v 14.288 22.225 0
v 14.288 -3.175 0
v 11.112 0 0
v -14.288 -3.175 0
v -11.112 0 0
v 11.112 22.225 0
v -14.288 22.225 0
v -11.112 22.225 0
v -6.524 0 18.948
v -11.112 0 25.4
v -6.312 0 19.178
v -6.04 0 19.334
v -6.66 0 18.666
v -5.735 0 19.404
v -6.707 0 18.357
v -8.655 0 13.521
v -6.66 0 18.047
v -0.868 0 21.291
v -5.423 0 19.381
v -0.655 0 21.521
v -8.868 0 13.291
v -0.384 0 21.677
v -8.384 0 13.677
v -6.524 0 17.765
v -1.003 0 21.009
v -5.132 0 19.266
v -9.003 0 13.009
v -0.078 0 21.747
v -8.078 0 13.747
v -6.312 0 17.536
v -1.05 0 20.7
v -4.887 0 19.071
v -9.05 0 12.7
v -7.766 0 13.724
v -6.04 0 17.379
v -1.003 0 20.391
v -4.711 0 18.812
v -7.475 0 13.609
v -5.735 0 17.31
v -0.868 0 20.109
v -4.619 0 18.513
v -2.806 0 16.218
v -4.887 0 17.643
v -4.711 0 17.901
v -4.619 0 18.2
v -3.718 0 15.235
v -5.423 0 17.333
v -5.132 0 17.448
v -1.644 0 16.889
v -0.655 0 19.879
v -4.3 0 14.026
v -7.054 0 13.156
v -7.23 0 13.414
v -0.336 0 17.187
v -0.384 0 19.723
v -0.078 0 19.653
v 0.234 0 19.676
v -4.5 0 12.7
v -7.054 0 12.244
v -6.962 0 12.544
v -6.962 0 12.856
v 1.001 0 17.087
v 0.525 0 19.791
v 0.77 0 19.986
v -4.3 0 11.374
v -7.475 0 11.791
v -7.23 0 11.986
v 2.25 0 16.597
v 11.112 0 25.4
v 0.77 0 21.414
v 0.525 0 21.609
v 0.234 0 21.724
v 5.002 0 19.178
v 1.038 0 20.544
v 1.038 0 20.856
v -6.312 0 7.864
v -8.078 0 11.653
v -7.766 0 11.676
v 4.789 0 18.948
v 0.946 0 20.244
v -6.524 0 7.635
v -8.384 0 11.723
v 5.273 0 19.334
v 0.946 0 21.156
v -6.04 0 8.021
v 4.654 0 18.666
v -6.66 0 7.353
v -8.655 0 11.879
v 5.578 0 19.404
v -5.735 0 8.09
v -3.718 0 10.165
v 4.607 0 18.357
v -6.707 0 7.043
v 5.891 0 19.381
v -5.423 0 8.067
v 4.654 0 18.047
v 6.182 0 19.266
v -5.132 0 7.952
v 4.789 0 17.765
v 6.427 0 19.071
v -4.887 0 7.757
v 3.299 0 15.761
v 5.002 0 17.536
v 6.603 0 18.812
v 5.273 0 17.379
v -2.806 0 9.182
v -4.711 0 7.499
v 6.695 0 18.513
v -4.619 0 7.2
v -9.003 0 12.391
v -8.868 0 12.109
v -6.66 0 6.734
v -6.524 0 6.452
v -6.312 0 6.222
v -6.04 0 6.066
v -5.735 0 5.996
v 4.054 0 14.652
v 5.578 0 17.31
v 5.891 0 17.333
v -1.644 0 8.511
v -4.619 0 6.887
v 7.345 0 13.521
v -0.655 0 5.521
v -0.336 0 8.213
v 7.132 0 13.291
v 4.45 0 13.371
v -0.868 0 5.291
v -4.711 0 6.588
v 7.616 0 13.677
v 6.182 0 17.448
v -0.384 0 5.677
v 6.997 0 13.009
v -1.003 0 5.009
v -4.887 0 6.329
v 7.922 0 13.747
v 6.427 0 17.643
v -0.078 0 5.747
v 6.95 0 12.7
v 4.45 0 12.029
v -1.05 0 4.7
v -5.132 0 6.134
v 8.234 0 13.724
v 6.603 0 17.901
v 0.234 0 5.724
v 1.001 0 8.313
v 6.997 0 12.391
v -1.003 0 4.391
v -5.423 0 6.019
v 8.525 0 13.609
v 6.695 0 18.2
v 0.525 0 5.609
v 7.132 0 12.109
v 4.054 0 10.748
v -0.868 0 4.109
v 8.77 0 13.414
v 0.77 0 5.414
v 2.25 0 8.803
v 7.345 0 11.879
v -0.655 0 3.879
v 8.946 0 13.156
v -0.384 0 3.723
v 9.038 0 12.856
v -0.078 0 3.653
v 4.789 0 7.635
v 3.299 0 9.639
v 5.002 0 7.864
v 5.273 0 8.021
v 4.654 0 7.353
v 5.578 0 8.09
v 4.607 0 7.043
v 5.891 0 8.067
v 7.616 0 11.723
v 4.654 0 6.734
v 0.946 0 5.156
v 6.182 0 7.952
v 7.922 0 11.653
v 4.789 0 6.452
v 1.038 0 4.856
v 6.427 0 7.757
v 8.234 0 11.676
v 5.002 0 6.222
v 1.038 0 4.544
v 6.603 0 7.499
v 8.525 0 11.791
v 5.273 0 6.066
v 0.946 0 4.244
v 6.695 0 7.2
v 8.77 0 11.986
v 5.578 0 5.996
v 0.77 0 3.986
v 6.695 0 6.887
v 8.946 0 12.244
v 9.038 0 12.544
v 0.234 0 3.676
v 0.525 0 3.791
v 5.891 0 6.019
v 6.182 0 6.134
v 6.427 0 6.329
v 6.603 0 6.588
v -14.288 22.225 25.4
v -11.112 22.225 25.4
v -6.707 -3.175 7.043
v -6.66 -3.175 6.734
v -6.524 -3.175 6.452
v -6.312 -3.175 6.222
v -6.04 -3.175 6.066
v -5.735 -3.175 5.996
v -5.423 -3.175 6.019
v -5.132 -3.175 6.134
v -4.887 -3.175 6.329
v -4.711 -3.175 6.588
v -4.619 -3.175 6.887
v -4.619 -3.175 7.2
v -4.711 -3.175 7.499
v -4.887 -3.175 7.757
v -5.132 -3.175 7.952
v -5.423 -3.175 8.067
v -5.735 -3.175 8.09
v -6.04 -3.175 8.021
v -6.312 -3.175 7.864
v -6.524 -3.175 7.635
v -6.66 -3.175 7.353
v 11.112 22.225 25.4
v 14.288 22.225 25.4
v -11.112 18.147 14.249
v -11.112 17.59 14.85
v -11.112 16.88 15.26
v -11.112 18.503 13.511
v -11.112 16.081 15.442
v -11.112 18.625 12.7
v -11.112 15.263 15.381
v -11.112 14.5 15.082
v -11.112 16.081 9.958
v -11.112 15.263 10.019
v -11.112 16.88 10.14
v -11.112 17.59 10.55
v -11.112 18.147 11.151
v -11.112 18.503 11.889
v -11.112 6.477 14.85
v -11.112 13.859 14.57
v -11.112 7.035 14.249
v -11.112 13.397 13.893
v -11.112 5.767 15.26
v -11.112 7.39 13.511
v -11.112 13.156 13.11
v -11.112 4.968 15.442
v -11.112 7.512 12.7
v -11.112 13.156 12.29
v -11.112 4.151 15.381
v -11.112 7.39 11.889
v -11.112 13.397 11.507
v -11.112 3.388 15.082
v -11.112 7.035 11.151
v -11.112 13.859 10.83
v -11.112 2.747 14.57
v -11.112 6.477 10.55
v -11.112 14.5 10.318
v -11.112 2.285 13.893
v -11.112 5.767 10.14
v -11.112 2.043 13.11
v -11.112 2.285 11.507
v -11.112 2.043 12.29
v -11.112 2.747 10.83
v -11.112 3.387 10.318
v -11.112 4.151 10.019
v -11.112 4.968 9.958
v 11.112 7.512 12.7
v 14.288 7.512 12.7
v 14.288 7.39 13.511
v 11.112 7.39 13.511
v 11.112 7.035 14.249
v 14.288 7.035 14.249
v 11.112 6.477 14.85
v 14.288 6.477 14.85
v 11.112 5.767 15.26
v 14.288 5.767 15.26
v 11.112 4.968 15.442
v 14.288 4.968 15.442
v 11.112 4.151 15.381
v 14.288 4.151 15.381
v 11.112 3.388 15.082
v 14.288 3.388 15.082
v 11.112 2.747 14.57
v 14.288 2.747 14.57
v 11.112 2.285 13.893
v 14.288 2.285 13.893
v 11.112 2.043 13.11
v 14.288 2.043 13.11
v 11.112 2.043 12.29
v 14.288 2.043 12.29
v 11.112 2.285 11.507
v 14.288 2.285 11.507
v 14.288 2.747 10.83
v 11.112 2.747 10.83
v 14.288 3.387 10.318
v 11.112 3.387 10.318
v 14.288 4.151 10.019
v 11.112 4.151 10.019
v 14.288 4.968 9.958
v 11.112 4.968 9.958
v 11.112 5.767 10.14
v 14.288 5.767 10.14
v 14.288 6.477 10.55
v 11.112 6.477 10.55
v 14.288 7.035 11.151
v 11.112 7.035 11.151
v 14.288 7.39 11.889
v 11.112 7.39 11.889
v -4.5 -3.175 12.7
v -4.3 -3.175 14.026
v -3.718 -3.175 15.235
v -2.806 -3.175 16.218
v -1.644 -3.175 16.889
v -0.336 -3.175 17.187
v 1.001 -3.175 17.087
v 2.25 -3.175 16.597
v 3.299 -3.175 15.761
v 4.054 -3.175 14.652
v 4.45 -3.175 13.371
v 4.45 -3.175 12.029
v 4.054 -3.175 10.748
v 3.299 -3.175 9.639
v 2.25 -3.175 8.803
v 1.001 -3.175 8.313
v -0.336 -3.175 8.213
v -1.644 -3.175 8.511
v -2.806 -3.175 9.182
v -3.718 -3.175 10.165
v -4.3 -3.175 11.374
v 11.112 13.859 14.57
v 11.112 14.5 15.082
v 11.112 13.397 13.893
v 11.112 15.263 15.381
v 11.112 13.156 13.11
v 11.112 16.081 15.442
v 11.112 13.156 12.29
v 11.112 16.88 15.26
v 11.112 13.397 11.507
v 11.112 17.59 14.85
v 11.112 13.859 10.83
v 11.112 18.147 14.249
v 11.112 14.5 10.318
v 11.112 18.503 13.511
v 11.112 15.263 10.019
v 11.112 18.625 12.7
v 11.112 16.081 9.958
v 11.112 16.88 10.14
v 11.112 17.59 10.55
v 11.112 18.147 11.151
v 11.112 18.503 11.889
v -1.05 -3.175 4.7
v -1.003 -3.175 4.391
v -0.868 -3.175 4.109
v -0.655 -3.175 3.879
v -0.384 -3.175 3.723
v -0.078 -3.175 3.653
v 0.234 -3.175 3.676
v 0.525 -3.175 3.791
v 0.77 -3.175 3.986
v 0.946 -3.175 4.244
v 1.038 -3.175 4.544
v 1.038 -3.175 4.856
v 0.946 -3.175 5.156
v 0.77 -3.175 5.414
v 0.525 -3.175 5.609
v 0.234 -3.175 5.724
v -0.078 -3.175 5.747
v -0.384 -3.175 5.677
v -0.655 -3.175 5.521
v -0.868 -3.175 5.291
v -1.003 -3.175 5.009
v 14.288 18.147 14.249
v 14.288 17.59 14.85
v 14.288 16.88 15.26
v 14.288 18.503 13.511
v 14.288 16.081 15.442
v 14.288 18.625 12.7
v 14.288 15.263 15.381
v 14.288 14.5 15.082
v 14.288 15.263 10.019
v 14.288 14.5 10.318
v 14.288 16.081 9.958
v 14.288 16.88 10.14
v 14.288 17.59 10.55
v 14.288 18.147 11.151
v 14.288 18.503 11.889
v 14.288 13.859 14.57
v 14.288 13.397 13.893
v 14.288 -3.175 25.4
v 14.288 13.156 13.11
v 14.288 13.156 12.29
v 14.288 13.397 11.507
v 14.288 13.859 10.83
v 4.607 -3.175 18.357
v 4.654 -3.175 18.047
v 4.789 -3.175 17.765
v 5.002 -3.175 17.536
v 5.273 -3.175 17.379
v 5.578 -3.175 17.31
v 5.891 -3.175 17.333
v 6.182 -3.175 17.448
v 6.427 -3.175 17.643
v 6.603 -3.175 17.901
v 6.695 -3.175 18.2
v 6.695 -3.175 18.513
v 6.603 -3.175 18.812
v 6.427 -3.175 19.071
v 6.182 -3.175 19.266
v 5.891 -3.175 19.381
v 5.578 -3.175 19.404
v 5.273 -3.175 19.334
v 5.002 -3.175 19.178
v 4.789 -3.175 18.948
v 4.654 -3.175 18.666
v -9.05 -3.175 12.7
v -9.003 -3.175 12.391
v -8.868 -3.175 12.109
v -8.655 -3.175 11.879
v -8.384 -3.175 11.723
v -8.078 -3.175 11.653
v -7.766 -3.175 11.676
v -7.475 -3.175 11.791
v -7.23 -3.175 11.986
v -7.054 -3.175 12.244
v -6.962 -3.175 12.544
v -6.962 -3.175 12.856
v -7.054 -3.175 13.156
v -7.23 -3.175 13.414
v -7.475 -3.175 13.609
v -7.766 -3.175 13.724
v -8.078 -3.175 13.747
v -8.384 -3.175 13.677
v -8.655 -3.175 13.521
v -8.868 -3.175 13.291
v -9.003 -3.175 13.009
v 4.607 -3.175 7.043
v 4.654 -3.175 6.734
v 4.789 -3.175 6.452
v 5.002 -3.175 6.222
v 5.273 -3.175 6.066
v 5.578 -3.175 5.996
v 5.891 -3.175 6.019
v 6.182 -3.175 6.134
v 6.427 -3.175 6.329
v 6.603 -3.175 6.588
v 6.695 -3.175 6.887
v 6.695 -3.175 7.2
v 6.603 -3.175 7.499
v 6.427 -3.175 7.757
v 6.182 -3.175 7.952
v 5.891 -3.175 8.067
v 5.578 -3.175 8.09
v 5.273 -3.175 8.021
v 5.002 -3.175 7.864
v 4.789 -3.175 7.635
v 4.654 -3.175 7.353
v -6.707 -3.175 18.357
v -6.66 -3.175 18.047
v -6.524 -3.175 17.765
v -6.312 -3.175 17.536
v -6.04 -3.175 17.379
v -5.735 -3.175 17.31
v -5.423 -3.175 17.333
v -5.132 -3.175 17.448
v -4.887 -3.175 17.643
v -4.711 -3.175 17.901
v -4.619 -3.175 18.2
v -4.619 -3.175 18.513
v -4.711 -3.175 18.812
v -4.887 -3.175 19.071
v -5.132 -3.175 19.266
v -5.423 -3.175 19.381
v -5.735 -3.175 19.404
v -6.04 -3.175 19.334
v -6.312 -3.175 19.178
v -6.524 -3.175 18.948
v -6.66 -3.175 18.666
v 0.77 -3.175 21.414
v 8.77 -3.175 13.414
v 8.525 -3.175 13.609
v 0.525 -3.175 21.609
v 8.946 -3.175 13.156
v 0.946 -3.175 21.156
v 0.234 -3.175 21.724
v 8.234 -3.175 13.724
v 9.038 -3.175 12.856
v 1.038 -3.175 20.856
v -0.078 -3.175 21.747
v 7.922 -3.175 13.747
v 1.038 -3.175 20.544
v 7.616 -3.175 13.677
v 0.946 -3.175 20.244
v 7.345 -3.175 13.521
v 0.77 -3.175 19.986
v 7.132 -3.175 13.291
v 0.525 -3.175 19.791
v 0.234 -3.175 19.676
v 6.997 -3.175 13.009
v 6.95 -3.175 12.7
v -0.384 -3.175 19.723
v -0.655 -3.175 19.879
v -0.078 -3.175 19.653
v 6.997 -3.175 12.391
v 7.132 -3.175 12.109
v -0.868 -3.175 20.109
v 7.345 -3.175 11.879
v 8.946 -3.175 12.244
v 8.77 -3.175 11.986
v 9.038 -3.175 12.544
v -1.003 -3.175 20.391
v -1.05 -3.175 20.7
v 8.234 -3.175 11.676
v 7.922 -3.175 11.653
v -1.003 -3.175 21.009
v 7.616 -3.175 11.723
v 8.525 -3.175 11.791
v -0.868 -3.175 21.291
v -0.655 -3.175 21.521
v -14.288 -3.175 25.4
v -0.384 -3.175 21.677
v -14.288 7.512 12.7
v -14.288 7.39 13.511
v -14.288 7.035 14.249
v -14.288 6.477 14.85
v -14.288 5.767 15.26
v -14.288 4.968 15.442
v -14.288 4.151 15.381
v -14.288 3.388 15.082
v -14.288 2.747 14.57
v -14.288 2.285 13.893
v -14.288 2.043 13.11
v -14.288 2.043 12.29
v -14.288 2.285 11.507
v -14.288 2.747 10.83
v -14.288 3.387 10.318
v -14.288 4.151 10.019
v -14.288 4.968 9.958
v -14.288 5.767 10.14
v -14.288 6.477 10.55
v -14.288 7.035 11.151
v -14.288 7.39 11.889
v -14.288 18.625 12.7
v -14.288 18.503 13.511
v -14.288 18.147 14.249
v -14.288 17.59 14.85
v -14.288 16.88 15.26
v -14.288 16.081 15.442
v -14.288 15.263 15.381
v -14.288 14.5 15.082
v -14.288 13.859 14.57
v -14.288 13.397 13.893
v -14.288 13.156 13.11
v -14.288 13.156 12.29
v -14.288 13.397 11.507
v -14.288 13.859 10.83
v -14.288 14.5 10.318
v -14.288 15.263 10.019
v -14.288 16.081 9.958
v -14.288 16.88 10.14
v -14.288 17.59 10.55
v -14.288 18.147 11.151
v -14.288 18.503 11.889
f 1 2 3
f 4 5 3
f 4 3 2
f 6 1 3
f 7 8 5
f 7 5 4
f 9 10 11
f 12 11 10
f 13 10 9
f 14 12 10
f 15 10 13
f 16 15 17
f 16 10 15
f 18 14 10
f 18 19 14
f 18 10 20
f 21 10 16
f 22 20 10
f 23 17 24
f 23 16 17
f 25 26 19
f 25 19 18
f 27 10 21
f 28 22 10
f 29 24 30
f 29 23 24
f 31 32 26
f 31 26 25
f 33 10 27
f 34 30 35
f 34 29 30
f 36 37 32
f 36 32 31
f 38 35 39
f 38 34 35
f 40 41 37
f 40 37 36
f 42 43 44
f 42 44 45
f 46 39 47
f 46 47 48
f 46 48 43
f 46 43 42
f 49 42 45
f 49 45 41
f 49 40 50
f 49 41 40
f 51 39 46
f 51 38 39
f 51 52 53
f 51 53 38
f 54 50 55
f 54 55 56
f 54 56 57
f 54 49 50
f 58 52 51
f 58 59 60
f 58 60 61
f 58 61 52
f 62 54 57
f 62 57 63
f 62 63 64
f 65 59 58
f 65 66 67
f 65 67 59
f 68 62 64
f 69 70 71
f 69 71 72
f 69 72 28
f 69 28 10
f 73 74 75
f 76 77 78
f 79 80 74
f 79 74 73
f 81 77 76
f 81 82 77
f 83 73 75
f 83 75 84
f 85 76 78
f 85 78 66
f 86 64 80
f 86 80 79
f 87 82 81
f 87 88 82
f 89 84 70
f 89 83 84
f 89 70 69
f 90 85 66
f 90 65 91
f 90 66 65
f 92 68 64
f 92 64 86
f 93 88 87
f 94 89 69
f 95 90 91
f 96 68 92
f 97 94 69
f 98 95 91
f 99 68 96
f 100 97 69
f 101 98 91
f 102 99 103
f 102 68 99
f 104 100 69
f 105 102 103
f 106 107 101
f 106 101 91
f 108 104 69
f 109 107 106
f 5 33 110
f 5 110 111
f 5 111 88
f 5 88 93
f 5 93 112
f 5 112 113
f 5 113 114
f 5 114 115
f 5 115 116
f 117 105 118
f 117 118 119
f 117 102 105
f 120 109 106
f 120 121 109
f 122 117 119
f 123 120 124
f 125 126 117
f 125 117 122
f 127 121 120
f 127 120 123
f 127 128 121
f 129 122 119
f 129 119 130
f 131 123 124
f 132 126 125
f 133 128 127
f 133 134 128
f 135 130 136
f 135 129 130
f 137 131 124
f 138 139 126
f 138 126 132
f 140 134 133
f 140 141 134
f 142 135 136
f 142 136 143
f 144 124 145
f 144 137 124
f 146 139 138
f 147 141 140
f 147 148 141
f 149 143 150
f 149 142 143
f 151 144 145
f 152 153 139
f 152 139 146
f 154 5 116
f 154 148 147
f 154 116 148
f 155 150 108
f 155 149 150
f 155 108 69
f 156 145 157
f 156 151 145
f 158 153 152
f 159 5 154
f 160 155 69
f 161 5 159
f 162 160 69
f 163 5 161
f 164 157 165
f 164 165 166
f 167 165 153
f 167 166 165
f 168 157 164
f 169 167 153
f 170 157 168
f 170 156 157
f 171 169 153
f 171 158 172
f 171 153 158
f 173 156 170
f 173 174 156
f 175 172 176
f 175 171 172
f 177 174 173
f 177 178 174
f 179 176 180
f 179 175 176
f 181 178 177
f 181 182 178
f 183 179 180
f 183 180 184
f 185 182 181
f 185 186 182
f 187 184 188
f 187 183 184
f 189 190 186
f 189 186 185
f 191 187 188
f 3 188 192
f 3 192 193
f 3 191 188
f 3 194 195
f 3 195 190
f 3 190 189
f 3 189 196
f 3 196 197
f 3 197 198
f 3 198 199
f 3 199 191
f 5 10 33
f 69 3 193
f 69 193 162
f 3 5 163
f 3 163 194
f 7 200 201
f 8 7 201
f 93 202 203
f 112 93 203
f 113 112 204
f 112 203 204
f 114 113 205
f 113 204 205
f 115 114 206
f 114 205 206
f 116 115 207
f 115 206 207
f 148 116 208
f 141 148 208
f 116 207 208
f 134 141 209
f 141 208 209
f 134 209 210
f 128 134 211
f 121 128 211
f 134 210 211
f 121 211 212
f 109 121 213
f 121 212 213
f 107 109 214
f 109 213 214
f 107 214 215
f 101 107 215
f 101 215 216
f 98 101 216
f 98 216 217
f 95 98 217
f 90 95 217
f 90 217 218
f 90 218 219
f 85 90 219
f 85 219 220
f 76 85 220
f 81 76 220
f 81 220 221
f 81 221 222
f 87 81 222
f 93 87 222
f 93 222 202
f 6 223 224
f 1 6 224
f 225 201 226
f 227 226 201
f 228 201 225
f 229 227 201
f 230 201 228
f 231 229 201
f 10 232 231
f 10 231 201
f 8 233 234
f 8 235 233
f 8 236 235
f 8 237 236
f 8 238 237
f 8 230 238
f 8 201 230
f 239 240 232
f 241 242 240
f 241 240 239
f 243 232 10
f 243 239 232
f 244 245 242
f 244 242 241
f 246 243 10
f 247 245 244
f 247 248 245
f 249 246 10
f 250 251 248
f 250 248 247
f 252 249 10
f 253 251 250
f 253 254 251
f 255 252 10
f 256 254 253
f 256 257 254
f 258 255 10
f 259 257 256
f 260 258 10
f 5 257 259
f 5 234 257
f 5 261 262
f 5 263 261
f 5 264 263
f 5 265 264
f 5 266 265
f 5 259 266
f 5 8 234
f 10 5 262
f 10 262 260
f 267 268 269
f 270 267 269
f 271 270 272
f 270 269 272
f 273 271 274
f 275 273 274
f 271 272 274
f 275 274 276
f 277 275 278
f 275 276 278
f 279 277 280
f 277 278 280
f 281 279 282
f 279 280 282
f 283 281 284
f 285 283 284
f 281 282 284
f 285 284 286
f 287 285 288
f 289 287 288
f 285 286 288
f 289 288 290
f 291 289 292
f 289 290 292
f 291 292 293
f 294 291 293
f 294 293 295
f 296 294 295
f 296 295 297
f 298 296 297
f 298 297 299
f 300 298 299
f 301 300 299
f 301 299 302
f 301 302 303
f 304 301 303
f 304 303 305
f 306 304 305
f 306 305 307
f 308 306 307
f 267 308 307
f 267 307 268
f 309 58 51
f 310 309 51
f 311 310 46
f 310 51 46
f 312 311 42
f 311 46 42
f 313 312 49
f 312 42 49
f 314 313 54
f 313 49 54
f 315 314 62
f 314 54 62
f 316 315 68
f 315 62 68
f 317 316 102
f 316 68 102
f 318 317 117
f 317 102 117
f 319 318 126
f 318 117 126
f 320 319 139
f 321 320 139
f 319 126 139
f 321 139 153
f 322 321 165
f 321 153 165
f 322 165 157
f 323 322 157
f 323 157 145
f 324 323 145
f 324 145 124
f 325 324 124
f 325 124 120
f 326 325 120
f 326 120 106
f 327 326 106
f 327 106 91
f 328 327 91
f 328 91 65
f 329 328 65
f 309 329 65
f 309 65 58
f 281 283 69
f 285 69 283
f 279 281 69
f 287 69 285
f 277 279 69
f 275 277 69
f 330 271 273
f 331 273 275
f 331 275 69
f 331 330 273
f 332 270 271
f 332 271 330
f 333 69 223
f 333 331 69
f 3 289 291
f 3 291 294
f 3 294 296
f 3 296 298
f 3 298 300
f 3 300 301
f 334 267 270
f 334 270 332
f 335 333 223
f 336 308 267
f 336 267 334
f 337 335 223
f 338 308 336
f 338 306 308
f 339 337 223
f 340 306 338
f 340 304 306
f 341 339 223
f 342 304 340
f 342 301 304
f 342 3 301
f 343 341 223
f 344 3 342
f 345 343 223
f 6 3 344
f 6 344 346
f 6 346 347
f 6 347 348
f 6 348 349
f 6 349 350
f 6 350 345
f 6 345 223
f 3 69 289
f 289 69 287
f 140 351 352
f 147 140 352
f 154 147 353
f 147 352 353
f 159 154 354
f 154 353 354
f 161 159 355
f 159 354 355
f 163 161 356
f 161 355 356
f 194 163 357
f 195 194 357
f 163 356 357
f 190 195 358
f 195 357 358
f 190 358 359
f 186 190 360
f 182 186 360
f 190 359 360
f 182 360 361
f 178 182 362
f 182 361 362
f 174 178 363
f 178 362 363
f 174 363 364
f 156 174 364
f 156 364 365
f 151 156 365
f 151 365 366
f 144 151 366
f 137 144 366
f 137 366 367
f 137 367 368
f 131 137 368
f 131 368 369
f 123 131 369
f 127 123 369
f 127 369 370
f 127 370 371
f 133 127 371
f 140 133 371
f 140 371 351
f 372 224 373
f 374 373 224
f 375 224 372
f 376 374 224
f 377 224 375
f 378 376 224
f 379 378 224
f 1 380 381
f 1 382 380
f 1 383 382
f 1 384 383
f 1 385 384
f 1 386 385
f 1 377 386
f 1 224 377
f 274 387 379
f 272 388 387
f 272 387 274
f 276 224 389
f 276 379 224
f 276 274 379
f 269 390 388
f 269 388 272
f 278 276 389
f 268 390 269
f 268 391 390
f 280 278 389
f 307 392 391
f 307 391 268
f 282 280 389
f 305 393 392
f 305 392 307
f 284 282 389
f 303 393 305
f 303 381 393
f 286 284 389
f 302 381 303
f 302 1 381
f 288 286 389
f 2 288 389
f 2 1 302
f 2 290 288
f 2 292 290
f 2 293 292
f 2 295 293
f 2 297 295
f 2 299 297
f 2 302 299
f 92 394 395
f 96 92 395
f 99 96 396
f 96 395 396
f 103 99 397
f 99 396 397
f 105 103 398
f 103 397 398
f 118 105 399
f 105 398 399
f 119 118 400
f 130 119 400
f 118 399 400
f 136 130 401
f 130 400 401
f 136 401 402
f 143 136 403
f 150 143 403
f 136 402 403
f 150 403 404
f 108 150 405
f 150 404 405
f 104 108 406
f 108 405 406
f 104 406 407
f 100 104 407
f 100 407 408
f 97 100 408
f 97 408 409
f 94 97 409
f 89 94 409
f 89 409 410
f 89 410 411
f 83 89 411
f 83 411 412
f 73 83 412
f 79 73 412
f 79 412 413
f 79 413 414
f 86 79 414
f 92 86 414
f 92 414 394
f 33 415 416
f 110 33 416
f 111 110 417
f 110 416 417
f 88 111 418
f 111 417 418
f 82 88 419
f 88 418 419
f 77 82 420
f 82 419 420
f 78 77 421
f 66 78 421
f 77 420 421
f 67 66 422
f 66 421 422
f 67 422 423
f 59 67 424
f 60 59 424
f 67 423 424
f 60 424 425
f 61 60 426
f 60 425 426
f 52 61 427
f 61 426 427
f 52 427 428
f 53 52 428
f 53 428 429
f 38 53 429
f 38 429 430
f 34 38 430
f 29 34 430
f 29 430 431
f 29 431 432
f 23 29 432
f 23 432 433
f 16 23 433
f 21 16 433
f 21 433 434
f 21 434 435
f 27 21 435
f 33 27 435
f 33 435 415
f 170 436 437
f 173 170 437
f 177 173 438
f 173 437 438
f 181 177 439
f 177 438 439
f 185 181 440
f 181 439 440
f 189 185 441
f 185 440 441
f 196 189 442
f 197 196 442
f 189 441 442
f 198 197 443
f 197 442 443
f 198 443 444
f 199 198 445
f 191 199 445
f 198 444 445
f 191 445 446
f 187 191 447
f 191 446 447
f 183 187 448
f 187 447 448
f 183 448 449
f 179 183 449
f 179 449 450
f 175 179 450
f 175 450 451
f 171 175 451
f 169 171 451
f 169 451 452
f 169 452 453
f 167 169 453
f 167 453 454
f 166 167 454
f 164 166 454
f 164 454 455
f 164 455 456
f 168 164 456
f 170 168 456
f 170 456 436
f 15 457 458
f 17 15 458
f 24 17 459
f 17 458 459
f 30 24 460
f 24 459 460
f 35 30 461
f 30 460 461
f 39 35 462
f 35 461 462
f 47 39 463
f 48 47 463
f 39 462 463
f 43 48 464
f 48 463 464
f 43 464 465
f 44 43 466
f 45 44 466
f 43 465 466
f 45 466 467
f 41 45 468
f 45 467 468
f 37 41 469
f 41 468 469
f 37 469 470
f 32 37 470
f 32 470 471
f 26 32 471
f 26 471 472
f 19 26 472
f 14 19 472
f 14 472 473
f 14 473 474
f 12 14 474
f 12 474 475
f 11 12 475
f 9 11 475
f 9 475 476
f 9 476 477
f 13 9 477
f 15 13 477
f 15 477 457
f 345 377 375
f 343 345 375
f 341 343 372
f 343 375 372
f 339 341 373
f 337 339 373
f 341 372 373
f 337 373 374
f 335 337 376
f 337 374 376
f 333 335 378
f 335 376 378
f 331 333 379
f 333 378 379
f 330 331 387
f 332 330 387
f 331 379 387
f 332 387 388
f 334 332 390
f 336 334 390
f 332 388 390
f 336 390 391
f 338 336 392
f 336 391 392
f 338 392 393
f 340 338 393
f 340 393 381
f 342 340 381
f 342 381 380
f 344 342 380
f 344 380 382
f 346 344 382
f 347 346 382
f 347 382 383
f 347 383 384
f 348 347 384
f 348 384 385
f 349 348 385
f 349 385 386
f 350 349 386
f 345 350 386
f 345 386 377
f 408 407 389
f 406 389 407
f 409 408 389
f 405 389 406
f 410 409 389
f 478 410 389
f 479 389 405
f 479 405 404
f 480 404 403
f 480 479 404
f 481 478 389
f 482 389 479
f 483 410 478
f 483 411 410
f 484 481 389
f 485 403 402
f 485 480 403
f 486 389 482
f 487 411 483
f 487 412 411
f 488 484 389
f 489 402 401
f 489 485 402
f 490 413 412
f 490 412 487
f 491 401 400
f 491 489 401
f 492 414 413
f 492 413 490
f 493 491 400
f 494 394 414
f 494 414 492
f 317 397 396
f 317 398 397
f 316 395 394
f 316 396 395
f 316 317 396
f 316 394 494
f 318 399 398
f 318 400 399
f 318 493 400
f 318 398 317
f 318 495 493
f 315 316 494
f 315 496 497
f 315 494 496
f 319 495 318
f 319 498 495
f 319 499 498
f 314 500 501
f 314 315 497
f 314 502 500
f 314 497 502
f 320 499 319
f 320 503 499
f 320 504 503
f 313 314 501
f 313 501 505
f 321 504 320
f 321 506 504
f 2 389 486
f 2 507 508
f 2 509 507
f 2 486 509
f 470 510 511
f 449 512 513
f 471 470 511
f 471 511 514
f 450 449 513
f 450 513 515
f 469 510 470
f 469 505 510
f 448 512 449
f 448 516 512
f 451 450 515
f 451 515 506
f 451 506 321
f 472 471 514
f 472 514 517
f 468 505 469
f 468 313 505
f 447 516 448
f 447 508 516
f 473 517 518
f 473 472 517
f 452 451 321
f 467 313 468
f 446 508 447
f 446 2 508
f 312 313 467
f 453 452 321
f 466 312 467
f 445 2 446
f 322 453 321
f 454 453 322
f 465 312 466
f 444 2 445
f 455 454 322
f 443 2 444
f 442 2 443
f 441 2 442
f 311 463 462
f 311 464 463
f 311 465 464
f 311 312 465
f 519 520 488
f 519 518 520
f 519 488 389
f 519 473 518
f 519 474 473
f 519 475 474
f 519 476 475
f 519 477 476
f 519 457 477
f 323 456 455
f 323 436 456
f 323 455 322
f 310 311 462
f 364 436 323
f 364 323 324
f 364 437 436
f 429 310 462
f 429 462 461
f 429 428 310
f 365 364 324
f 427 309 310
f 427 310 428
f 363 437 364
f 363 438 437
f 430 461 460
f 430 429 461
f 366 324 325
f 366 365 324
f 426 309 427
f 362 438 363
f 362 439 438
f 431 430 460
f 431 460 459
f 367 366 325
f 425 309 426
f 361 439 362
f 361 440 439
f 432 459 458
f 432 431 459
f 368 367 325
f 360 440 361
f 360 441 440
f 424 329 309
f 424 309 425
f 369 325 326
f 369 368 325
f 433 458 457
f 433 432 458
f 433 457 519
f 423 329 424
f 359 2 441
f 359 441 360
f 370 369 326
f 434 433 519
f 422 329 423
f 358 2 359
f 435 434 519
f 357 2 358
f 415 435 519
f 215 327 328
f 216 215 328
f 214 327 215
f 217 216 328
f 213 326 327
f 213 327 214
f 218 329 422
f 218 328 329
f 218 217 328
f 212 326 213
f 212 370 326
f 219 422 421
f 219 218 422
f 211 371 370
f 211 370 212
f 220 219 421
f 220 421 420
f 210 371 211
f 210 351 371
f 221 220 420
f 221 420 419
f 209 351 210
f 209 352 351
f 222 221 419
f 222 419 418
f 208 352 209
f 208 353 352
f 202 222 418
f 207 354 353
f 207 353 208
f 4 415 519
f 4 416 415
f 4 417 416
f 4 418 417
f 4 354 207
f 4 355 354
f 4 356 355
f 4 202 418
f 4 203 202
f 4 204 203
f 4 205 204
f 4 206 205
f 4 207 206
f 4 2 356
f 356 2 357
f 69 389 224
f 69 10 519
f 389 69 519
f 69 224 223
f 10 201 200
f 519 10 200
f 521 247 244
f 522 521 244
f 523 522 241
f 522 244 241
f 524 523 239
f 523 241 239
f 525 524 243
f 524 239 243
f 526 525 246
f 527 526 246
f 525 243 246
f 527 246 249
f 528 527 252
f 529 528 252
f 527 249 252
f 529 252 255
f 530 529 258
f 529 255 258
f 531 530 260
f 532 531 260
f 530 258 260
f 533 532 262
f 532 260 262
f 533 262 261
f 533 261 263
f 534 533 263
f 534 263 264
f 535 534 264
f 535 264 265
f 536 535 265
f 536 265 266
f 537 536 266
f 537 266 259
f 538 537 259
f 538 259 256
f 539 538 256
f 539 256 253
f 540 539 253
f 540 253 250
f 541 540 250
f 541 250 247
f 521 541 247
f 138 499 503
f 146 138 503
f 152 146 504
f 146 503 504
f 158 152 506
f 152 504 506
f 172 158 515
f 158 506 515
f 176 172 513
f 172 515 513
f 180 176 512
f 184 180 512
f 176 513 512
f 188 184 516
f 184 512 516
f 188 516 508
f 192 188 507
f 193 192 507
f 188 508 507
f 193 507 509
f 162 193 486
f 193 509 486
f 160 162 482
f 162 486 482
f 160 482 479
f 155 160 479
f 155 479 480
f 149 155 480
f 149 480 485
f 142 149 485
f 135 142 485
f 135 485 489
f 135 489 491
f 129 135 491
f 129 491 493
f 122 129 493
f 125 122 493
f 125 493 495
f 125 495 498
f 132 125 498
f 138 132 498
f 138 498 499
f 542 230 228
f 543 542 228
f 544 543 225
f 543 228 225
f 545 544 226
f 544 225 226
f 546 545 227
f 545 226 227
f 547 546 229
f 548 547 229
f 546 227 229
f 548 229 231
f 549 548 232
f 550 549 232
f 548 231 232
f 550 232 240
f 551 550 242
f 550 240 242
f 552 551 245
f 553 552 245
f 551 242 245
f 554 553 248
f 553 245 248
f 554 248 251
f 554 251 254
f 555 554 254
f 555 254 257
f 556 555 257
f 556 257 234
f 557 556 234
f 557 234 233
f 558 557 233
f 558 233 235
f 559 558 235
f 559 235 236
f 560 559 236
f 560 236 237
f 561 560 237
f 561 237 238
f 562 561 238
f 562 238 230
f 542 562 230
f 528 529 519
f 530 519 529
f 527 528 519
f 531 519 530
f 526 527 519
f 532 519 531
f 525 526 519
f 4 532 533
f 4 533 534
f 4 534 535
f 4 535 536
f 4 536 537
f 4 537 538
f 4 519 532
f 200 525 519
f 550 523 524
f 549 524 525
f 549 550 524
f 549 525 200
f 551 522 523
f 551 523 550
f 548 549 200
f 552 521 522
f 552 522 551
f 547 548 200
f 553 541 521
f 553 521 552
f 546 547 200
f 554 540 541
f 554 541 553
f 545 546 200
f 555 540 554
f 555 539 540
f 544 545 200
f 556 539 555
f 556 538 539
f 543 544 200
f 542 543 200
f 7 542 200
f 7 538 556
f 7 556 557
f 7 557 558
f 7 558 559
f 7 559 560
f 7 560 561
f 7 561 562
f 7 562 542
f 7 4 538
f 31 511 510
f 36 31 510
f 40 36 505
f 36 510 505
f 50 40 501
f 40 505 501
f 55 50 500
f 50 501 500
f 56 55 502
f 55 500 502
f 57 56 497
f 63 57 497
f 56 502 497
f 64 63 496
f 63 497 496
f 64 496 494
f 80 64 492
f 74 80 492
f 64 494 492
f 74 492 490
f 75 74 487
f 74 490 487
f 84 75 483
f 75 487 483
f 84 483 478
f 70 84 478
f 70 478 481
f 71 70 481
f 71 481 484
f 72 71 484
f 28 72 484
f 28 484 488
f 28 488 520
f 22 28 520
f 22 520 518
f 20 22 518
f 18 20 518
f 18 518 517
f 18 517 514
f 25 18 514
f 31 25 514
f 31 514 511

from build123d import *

# Parameters (mm, degrees)
BOSS_EXTRUDE1_DEPTH   = 25.4
SKETCH2_R             = 2.75
CUT_EXTRUDE1_DEPTH    = 45.22263278
SKETCH3_R             = 4.500000017
CUT_EXTRUDE2_DEPTH    = 37.650283508
F_2_0MM_DOWEL_HOLE1_D = 2.1


with BuildPart() as part:
    # Sketch1 → Boss-Extrude1 (new body)
    with BuildSketch(Plane.XY):
        Polygon((-11.1125, 0), (11.1125, 0), (11.1125, 22.225), (14.2875, 22.225), (14.2875, -3.175), (-14.2875, -3.175), (-14.2875, 22.225), (-11.1125, 22.225), align=None)
    extrude(amount=BOSS_EXTRUDE1_DEPTH)

    # Sketch2 → Cut-Extrude1 (cut, through all)
    with BuildSketch(Plane(origin=(14.2875, 0, 0), x_dir=(0, 0, -1), z_dir=(1, 0, 0))):
        with Locations(Location((-12.7, 15.875, 0), (0, 0, 90))):
            Circle(SKETCH2_R)
        with Locations(Location((-12.7, 4.7625, 0), (0, 0, 90))):
            Circle(SKETCH2_R)
    extrude(amount=-CUT_EXTRUDE1_DEPTH, mode=Mode.SUBTRACT)

    # Sketch3 → Cut-Extrude2 (cut, through all)
    with BuildSketch(Plane(origin=(0, 0, 0), x_dir=(1, 0, 0), z_dir=(0, 1, 0))):
        with Locations(Location((0, -12.7, 0), (0, 0, 180))):
            Circle(SKETCH3_R)
    extrude(amount=-CUT_EXTRUDE2_DEPTH, mode=Mode.SUBTRACT)

    # Ø2.0mm Dowel Hole1 (through all)
    with Locations(Plane(origin=(0, 0, 0), x_dir=(1, 0, 0), z_dir=(0, 1, 0))):
        with Locations((0, -4.699999998), (5.656854251, -7.043145749), (8.000000002, -12.7), (5.656854251, -18.356854251), (0, -20.700000002), (-5.656854251, -18.356854251), (-8.000000002, -12.7), (-5.656854251, -7.043145749)):
            Hole(F_2_0MM_DOWEL_HOLE1_D / 2)


solid = part.part
